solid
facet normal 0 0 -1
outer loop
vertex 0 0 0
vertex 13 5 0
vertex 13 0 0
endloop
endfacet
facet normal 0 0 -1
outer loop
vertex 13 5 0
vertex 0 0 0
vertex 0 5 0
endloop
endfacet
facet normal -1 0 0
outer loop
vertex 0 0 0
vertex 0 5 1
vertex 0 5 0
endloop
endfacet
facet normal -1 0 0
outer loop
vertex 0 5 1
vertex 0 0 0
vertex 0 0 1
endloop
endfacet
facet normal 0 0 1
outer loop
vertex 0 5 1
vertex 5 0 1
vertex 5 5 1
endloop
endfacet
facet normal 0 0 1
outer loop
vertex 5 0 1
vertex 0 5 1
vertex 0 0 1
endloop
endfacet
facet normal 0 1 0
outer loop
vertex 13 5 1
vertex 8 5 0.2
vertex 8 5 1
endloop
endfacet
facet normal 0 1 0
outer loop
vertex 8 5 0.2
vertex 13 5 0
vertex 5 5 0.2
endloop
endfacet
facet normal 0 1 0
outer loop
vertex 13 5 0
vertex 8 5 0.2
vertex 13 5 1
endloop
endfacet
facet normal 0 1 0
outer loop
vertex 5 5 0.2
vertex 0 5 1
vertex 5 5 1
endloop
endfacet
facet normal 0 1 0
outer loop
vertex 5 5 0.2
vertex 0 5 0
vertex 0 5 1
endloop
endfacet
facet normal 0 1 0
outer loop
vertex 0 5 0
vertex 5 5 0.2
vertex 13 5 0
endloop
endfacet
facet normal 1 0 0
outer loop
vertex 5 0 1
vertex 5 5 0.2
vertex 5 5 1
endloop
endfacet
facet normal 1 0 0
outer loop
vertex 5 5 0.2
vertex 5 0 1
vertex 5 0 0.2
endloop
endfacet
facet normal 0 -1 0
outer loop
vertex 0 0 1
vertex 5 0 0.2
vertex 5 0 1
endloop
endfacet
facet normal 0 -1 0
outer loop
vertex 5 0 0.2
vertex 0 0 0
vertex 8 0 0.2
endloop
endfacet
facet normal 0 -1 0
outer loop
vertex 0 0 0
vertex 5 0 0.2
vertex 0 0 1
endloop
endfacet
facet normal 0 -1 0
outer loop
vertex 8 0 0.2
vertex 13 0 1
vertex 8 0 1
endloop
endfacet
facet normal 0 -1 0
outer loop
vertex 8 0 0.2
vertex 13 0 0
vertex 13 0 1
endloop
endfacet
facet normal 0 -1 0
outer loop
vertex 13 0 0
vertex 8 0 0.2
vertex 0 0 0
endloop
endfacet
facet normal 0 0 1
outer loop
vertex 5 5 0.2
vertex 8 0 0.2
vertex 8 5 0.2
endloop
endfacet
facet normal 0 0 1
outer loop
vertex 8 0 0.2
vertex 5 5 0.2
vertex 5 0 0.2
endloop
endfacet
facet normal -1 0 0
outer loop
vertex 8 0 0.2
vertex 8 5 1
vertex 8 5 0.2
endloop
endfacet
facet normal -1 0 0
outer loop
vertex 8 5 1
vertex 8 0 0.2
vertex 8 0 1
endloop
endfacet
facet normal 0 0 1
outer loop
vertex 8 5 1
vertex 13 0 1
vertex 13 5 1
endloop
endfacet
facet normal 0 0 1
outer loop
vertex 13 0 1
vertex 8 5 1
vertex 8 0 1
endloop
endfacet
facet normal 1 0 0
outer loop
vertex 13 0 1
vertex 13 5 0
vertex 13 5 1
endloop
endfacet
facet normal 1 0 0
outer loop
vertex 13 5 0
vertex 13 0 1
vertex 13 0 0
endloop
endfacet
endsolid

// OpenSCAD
linear_extrude(1)
    square(5);

linear_extrude(0.2)
    translate([5,0])
    square([3,5]);

linear_extrude(1)
    translate([8,0])
    square(5);
